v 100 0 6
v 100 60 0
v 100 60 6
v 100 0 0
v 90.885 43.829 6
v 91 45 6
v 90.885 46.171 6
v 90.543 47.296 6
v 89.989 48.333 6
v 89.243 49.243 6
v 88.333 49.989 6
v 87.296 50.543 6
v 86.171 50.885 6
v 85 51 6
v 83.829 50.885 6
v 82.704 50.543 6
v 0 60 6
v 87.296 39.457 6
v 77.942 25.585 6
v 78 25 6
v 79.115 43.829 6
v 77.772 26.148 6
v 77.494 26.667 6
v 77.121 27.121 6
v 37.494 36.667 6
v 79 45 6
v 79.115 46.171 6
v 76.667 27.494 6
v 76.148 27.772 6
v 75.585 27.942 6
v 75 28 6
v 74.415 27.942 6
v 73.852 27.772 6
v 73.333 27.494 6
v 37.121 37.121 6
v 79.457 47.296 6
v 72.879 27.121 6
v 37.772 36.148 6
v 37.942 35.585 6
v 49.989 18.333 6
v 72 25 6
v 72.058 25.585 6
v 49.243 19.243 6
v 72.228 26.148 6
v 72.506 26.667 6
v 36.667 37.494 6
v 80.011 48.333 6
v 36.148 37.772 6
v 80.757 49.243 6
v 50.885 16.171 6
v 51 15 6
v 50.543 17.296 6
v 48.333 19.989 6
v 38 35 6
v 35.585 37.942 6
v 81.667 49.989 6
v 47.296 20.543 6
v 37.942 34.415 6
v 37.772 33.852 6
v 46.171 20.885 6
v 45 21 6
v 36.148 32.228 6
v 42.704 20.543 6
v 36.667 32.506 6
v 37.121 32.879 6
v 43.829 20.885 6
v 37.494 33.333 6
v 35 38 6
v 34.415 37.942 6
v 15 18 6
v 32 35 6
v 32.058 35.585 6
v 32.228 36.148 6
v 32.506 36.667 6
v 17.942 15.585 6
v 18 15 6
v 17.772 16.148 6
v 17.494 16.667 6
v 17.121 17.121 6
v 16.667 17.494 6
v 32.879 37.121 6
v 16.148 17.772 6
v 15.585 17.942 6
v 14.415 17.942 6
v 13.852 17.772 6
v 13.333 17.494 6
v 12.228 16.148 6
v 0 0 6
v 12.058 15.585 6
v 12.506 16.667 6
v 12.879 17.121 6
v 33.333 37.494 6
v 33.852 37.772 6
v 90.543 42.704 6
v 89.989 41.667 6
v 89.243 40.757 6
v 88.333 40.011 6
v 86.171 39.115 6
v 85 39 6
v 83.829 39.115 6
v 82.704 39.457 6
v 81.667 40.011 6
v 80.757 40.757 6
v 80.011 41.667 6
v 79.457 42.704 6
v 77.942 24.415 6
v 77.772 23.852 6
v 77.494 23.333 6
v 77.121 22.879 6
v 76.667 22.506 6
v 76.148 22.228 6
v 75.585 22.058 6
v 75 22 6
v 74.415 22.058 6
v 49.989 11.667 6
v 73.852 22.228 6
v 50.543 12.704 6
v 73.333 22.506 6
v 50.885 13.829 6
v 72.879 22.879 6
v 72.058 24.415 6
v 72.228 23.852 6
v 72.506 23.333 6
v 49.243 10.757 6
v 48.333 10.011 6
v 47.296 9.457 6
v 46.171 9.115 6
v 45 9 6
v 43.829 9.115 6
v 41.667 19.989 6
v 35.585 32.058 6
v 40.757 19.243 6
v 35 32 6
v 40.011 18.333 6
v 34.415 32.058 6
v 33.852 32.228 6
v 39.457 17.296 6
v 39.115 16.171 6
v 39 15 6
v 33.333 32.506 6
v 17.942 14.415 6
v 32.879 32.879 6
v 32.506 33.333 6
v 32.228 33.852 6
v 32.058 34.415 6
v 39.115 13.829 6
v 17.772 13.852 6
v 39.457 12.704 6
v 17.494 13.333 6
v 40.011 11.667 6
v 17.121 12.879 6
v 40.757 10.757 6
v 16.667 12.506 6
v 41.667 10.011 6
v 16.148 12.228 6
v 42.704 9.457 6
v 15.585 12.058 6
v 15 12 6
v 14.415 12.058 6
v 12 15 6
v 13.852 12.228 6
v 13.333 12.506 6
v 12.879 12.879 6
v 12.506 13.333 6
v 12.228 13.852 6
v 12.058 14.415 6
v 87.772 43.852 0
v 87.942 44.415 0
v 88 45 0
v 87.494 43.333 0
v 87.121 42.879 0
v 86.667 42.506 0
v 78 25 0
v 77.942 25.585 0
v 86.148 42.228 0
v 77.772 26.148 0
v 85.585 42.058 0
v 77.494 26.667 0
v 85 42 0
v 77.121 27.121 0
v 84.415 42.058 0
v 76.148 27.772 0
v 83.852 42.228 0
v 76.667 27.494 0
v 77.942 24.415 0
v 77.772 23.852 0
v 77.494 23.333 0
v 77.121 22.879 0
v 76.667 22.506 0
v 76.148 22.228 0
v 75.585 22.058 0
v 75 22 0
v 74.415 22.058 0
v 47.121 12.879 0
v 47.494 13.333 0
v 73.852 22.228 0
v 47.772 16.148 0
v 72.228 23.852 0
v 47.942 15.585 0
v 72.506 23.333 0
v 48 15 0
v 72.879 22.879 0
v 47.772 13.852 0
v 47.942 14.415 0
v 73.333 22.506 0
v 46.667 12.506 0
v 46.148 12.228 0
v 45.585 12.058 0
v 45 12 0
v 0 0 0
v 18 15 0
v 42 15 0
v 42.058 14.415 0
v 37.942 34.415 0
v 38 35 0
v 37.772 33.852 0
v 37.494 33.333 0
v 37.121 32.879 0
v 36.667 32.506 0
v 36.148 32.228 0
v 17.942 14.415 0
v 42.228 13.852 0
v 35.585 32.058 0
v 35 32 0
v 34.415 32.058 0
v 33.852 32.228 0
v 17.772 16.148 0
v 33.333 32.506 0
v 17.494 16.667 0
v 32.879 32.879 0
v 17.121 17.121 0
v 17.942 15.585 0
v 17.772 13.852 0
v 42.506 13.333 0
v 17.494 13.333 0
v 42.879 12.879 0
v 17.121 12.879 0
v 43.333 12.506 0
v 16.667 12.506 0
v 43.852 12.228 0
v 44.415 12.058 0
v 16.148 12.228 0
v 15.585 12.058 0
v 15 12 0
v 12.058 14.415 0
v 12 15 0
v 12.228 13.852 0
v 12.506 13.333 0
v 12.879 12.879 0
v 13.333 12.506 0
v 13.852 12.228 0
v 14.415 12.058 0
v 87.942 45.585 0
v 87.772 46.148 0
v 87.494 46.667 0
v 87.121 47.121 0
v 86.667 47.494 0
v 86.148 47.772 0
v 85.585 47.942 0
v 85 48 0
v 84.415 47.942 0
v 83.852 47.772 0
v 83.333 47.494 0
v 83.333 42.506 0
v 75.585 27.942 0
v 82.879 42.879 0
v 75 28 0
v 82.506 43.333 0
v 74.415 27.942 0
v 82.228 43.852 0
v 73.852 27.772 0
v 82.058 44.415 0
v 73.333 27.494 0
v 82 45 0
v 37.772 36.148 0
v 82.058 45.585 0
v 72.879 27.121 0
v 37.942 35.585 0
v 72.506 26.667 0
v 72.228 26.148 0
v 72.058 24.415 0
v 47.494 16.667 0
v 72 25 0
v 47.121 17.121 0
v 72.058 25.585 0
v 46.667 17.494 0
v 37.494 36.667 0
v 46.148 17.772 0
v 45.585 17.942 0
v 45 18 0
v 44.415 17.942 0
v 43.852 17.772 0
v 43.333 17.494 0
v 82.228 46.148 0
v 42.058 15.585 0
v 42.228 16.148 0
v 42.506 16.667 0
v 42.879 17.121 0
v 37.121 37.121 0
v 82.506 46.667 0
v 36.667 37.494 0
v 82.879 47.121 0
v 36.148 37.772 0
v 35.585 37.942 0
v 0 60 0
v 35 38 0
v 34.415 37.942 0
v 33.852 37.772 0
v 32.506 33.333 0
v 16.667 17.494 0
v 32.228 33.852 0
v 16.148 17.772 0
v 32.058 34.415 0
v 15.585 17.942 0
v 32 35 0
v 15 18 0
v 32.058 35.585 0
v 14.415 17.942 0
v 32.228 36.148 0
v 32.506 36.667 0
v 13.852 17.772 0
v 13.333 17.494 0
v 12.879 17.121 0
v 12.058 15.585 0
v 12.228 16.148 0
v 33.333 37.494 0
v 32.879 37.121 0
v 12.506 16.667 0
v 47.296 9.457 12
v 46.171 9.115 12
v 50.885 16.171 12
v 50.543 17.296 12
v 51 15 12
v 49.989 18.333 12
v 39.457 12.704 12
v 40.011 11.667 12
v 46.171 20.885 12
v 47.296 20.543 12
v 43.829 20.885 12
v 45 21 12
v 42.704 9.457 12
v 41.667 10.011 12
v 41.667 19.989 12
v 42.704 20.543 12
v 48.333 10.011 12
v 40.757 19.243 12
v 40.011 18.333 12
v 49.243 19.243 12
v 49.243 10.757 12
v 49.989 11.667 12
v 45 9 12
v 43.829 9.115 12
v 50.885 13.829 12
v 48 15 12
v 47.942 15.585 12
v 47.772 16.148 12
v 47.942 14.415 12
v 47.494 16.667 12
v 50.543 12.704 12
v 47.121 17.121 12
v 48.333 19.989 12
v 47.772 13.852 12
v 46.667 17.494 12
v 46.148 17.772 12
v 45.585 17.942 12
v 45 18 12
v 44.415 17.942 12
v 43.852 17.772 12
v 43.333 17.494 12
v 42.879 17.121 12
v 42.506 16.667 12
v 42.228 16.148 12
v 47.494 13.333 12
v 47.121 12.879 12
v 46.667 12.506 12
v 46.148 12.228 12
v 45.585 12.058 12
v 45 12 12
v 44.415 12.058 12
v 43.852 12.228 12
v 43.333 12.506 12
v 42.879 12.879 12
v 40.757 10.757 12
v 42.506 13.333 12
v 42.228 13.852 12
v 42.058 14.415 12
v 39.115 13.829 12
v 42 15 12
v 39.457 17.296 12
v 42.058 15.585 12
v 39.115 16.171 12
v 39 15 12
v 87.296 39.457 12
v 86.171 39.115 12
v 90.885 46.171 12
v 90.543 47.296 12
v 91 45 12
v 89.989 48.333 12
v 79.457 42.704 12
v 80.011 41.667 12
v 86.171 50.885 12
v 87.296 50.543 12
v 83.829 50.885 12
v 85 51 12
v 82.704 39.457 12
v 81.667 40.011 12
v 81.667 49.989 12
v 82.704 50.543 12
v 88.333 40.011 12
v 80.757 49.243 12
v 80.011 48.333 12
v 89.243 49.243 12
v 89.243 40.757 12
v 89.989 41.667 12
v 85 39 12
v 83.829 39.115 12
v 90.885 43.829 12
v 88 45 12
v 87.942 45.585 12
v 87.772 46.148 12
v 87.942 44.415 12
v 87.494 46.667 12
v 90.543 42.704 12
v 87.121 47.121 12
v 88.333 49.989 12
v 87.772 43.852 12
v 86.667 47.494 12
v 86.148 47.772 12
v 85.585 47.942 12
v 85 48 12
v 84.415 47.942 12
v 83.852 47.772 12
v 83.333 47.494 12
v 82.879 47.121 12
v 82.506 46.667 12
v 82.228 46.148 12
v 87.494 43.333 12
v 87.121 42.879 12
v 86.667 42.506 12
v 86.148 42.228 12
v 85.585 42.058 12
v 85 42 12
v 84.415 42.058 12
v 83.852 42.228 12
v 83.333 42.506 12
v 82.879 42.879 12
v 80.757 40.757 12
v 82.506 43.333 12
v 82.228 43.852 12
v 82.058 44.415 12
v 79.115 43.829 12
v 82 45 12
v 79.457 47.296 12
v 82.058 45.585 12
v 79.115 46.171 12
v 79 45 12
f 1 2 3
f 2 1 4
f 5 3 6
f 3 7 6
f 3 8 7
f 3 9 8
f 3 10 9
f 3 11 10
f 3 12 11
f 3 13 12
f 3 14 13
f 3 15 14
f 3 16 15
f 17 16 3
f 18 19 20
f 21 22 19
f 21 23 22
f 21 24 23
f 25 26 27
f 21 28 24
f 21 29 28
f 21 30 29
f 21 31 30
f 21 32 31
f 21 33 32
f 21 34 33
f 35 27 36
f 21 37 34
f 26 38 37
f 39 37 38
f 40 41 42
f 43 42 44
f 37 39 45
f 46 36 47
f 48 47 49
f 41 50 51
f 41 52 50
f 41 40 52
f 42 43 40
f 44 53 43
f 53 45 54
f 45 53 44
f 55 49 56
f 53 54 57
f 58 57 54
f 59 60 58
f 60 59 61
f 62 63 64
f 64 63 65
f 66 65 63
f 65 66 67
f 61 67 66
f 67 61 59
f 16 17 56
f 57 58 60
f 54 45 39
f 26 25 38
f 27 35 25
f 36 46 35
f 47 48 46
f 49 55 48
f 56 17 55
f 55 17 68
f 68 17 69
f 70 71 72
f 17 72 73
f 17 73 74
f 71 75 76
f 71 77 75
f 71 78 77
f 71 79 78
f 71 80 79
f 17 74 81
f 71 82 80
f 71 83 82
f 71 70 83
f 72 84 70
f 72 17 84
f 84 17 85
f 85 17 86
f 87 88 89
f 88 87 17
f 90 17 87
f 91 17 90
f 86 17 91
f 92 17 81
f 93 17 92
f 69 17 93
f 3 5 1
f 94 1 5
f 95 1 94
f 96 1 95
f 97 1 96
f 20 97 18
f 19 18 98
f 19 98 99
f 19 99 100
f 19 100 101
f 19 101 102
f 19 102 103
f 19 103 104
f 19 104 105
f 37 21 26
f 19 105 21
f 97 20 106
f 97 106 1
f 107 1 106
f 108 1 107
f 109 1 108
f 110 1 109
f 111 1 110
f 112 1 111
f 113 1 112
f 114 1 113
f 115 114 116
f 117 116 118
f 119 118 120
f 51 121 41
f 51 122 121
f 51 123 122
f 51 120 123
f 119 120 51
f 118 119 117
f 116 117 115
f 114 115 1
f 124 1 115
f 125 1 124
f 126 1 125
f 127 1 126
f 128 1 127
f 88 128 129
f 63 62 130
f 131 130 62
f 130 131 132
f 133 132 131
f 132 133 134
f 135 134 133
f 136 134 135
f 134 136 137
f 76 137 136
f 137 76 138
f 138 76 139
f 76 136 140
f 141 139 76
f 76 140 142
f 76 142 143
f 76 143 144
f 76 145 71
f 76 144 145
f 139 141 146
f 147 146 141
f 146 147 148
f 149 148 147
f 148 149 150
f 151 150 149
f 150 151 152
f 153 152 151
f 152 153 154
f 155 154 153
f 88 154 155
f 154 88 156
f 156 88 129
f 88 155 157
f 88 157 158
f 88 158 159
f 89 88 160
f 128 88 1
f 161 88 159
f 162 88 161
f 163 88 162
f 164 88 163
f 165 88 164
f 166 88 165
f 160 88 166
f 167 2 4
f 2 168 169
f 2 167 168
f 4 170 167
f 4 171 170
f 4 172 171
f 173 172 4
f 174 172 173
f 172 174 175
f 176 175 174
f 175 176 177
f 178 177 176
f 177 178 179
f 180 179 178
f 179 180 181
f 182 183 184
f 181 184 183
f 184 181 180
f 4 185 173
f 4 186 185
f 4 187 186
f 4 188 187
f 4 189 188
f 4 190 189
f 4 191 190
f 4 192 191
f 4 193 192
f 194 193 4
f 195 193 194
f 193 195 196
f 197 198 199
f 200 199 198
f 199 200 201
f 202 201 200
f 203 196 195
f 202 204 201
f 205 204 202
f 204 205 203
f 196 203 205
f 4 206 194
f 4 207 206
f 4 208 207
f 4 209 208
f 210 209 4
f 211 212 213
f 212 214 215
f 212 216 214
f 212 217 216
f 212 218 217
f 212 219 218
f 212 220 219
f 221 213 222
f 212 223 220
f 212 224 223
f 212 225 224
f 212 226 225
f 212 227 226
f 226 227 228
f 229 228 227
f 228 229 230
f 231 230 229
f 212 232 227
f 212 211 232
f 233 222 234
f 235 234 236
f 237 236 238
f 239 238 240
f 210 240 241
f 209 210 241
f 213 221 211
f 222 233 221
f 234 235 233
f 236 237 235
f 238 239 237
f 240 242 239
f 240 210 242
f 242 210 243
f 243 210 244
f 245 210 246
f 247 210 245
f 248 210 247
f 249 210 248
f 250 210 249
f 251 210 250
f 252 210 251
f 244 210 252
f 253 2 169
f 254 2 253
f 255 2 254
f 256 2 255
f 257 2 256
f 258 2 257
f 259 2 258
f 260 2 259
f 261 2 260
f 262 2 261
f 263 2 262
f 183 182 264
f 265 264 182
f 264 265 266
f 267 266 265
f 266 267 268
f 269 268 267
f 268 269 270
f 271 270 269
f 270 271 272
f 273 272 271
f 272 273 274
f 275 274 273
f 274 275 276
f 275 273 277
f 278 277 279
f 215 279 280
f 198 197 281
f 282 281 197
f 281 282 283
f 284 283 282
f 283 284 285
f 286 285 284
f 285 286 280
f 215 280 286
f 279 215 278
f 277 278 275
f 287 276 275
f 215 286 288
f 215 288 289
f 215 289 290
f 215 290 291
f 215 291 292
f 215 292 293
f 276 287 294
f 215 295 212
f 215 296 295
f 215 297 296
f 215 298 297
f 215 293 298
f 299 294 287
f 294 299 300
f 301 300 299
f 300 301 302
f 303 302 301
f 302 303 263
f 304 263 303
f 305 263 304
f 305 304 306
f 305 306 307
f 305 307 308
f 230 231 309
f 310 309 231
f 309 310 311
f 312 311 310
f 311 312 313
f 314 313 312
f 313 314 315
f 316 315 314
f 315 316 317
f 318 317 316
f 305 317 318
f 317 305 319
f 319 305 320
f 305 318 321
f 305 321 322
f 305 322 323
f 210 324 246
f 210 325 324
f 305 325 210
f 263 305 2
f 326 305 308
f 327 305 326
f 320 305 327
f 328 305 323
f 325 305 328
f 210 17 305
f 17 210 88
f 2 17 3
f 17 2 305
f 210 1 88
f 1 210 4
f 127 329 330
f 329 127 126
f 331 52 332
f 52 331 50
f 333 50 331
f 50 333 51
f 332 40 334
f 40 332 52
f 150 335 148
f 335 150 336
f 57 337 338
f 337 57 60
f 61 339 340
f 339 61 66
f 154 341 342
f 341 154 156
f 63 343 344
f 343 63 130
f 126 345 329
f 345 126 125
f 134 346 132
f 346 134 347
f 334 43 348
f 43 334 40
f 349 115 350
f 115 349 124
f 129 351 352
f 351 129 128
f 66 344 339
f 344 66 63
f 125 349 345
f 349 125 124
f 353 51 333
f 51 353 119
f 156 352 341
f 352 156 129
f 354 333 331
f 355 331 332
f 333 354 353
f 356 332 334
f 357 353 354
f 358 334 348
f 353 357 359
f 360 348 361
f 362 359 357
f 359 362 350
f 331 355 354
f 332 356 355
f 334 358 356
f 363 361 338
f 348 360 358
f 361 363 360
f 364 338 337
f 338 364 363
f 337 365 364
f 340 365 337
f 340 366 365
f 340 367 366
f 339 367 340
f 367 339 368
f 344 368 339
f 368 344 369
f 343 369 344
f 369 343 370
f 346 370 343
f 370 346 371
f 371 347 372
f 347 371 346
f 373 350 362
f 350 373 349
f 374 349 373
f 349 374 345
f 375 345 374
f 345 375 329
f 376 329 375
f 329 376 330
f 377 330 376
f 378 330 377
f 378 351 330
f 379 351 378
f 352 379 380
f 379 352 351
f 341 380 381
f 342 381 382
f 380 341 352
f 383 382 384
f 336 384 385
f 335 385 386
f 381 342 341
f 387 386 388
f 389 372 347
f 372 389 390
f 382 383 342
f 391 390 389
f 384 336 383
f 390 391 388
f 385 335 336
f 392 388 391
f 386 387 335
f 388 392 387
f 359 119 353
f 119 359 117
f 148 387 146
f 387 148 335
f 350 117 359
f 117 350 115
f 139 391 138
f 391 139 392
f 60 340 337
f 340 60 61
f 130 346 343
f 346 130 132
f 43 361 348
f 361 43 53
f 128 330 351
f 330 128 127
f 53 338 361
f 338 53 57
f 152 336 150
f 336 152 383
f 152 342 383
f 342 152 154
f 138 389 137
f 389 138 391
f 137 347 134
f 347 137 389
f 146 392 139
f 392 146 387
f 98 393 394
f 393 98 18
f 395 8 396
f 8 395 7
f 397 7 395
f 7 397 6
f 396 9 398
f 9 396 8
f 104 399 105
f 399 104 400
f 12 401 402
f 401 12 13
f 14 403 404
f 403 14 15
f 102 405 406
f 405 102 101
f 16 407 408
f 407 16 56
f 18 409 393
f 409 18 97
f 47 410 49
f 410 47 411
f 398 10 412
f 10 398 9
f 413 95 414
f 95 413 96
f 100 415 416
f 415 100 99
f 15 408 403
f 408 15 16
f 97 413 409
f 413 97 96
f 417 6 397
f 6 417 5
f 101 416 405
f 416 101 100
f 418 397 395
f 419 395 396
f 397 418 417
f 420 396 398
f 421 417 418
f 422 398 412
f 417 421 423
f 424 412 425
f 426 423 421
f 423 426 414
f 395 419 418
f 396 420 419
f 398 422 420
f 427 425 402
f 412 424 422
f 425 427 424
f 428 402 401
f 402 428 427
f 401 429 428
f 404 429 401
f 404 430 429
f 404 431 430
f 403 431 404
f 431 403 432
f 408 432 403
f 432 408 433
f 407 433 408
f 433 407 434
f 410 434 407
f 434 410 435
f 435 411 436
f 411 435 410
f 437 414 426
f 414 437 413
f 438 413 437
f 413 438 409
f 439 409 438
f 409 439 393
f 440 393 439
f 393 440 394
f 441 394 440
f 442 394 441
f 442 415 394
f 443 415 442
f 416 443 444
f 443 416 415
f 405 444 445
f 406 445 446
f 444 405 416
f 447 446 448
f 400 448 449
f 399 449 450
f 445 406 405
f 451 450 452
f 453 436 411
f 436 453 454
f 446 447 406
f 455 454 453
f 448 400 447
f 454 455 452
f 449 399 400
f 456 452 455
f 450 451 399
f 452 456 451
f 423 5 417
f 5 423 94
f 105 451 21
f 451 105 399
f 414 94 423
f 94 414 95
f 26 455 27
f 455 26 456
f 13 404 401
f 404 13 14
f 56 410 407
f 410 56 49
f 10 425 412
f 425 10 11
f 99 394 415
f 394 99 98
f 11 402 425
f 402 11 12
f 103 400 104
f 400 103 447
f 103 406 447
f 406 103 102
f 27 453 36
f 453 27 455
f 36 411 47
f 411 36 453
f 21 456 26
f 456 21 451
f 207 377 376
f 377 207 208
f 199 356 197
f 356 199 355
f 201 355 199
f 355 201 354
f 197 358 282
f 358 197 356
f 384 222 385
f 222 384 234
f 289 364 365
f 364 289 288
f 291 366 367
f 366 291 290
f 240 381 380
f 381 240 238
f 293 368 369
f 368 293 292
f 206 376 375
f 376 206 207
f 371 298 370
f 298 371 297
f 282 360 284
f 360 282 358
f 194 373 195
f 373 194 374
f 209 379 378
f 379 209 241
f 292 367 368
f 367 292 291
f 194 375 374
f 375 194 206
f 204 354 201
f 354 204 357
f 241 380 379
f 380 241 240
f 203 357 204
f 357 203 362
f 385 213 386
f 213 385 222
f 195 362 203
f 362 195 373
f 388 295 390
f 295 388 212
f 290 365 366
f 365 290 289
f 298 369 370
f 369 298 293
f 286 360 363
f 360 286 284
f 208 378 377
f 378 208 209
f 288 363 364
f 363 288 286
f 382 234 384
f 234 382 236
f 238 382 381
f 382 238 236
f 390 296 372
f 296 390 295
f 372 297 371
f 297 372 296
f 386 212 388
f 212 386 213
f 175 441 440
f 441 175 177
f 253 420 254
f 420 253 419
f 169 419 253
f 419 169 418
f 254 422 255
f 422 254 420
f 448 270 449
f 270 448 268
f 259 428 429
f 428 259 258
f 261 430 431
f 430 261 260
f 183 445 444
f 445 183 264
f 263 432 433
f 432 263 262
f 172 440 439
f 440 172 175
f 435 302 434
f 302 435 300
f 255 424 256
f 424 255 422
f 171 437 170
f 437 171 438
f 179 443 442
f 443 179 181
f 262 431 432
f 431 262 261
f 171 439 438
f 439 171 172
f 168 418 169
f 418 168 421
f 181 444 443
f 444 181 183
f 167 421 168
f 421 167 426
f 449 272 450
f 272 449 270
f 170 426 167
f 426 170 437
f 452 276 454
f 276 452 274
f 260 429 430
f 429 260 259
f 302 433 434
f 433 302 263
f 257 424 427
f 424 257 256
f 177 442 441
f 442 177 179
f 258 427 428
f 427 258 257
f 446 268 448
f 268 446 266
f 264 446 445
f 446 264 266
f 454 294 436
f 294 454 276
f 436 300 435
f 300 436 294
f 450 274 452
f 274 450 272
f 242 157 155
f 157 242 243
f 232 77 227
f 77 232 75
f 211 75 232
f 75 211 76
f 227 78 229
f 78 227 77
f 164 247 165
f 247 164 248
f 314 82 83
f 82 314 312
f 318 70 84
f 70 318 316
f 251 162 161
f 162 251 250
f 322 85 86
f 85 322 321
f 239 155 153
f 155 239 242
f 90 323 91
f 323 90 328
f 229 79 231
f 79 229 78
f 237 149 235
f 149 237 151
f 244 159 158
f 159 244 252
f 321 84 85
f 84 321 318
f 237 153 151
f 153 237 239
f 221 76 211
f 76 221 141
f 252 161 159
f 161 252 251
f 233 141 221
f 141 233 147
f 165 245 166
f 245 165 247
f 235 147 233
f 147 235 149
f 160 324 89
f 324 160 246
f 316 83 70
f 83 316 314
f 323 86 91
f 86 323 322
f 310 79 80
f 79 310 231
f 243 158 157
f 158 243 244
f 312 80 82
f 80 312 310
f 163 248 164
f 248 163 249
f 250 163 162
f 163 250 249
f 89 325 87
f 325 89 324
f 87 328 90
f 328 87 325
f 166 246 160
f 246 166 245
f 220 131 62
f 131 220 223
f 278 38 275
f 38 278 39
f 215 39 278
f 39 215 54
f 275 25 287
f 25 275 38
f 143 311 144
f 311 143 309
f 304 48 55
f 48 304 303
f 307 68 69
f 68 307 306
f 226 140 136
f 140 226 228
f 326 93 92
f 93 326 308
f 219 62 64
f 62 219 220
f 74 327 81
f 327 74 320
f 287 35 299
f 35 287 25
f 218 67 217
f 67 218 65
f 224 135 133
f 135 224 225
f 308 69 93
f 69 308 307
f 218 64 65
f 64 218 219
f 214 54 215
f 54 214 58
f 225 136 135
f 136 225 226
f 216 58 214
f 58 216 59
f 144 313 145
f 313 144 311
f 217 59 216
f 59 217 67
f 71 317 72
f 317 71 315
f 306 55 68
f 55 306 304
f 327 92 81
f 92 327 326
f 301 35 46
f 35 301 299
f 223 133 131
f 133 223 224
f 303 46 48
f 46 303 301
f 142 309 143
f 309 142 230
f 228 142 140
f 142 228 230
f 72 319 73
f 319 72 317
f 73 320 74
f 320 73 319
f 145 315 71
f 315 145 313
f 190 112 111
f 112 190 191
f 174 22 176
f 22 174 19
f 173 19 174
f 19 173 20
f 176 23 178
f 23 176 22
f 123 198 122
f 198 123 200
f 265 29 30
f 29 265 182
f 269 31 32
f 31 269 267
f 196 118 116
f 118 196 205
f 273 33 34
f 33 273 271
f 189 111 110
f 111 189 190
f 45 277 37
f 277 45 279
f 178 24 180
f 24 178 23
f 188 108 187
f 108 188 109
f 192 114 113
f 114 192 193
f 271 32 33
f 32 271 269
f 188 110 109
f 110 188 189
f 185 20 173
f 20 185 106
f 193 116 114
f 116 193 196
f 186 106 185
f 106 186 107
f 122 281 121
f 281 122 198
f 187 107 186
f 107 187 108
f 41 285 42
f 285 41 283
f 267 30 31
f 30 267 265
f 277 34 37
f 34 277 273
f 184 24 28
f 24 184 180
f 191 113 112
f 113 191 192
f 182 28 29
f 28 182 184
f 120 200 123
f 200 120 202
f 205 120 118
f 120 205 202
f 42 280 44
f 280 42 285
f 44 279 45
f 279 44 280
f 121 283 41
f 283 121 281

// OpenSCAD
$fn = 32;

// ----------------------------------------------------------------------
// Mixed field: bosses and holes at given coordinates
// ----------------------------------------------------------------------

// --- parameters (mm) ---
plate_l = 100;            // plate length, X
plate_w = 60;             // plate width, Y
plate_t = 6;              // plate thickness, Z
boss_d = 12;              // boss diameter
boss_h = 6;               // boss height above the plate
hole_d = 6;               // through hole diameter

total_h = plate_t + boss_h;  // overall height

difference() {
  union() {
    cube([plate_l, plate_w, plate_t]);
    translate([45, 15, plate_t]) cylinder(h = boss_h, d = boss_d);
    translate([85, 45, plate_t]) cylinder(h = boss_h, d = boss_d);
  }
  translate([45, 15, -1]) cylinder(h = total_h + 2, d = boss_d / 2);
  translate([85, 45, -1]) cylinder(h = total_h + 2, d = boss_d / 2);
  translate([15, 15, -1]) cylinder(h = plate_t + 2, d = hole_d);
  translate([35, 35, -1]) cylinder(h = plate_t + 2, d = hole_d);
  translate([75, 25, -1]) cylinder(h = plate_t + 2, d = hole_d);
}
